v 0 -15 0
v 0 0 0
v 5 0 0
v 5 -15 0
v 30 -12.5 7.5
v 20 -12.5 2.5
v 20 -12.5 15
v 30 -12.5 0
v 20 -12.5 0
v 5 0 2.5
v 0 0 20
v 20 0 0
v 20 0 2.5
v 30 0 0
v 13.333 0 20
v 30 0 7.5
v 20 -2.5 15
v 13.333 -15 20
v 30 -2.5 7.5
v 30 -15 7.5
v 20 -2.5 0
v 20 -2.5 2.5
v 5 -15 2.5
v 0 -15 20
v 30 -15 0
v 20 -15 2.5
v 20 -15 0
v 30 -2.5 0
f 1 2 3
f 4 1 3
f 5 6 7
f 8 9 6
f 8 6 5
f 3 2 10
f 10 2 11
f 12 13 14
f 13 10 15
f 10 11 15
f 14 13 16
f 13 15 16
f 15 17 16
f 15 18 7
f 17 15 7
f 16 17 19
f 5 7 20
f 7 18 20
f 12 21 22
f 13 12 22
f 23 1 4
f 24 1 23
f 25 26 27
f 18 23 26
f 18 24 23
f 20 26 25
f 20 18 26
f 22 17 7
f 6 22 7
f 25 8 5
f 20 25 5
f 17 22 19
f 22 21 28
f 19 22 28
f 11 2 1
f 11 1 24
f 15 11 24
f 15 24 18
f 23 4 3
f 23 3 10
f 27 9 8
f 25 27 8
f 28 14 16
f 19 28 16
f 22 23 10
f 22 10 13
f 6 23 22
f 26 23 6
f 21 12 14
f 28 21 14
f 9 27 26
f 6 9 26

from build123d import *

# Parameters (mm, degrees)
F0_W     = 30
F0_H     = 20
F1_DEPTH = 15
F2_W     = 15
F2_H     = 2.5
F3_DEPTH = 15.001
F4_W     = 10
F4_H     = 10
F5_DEPTH = 20.001


with BuildPart() as f1:
    # F0 (on Front) → F1 (new body)
    with BuildSketch(Plane.XZ):
        with Locations((15, 10)):
            Rectangle(F0_W, F0_H)
    extrude(amount=F1_DEPTH)

    # F2 (on face) → F3 (cut, through all)
    with BuildSketch(Plane.XZ.offset(15)):
        with Locations((12.5, 1.25)):
            Rectangle(F2_W, F2_H)
        Polygon((30, 7.5), (30, 20), (13.333333, 20), align=None)
    extrude(amount=-F3_DEPTH, mode=Mode.SUBTRACT)

    # F4 (on face) → F5 (cut, through all)
    with BuildSketch(Plane(origin=(0, 0, 0), x_dir=(1, 0, 0), z_dir=(0, 0, -1))):
        with Locations((25, 7.5)):
            Rectangle(F4_W, F4_H)
    extrude(amount=-F5_DEPTH, mode=Mode.SUBTRACT)


solid = f1.part
